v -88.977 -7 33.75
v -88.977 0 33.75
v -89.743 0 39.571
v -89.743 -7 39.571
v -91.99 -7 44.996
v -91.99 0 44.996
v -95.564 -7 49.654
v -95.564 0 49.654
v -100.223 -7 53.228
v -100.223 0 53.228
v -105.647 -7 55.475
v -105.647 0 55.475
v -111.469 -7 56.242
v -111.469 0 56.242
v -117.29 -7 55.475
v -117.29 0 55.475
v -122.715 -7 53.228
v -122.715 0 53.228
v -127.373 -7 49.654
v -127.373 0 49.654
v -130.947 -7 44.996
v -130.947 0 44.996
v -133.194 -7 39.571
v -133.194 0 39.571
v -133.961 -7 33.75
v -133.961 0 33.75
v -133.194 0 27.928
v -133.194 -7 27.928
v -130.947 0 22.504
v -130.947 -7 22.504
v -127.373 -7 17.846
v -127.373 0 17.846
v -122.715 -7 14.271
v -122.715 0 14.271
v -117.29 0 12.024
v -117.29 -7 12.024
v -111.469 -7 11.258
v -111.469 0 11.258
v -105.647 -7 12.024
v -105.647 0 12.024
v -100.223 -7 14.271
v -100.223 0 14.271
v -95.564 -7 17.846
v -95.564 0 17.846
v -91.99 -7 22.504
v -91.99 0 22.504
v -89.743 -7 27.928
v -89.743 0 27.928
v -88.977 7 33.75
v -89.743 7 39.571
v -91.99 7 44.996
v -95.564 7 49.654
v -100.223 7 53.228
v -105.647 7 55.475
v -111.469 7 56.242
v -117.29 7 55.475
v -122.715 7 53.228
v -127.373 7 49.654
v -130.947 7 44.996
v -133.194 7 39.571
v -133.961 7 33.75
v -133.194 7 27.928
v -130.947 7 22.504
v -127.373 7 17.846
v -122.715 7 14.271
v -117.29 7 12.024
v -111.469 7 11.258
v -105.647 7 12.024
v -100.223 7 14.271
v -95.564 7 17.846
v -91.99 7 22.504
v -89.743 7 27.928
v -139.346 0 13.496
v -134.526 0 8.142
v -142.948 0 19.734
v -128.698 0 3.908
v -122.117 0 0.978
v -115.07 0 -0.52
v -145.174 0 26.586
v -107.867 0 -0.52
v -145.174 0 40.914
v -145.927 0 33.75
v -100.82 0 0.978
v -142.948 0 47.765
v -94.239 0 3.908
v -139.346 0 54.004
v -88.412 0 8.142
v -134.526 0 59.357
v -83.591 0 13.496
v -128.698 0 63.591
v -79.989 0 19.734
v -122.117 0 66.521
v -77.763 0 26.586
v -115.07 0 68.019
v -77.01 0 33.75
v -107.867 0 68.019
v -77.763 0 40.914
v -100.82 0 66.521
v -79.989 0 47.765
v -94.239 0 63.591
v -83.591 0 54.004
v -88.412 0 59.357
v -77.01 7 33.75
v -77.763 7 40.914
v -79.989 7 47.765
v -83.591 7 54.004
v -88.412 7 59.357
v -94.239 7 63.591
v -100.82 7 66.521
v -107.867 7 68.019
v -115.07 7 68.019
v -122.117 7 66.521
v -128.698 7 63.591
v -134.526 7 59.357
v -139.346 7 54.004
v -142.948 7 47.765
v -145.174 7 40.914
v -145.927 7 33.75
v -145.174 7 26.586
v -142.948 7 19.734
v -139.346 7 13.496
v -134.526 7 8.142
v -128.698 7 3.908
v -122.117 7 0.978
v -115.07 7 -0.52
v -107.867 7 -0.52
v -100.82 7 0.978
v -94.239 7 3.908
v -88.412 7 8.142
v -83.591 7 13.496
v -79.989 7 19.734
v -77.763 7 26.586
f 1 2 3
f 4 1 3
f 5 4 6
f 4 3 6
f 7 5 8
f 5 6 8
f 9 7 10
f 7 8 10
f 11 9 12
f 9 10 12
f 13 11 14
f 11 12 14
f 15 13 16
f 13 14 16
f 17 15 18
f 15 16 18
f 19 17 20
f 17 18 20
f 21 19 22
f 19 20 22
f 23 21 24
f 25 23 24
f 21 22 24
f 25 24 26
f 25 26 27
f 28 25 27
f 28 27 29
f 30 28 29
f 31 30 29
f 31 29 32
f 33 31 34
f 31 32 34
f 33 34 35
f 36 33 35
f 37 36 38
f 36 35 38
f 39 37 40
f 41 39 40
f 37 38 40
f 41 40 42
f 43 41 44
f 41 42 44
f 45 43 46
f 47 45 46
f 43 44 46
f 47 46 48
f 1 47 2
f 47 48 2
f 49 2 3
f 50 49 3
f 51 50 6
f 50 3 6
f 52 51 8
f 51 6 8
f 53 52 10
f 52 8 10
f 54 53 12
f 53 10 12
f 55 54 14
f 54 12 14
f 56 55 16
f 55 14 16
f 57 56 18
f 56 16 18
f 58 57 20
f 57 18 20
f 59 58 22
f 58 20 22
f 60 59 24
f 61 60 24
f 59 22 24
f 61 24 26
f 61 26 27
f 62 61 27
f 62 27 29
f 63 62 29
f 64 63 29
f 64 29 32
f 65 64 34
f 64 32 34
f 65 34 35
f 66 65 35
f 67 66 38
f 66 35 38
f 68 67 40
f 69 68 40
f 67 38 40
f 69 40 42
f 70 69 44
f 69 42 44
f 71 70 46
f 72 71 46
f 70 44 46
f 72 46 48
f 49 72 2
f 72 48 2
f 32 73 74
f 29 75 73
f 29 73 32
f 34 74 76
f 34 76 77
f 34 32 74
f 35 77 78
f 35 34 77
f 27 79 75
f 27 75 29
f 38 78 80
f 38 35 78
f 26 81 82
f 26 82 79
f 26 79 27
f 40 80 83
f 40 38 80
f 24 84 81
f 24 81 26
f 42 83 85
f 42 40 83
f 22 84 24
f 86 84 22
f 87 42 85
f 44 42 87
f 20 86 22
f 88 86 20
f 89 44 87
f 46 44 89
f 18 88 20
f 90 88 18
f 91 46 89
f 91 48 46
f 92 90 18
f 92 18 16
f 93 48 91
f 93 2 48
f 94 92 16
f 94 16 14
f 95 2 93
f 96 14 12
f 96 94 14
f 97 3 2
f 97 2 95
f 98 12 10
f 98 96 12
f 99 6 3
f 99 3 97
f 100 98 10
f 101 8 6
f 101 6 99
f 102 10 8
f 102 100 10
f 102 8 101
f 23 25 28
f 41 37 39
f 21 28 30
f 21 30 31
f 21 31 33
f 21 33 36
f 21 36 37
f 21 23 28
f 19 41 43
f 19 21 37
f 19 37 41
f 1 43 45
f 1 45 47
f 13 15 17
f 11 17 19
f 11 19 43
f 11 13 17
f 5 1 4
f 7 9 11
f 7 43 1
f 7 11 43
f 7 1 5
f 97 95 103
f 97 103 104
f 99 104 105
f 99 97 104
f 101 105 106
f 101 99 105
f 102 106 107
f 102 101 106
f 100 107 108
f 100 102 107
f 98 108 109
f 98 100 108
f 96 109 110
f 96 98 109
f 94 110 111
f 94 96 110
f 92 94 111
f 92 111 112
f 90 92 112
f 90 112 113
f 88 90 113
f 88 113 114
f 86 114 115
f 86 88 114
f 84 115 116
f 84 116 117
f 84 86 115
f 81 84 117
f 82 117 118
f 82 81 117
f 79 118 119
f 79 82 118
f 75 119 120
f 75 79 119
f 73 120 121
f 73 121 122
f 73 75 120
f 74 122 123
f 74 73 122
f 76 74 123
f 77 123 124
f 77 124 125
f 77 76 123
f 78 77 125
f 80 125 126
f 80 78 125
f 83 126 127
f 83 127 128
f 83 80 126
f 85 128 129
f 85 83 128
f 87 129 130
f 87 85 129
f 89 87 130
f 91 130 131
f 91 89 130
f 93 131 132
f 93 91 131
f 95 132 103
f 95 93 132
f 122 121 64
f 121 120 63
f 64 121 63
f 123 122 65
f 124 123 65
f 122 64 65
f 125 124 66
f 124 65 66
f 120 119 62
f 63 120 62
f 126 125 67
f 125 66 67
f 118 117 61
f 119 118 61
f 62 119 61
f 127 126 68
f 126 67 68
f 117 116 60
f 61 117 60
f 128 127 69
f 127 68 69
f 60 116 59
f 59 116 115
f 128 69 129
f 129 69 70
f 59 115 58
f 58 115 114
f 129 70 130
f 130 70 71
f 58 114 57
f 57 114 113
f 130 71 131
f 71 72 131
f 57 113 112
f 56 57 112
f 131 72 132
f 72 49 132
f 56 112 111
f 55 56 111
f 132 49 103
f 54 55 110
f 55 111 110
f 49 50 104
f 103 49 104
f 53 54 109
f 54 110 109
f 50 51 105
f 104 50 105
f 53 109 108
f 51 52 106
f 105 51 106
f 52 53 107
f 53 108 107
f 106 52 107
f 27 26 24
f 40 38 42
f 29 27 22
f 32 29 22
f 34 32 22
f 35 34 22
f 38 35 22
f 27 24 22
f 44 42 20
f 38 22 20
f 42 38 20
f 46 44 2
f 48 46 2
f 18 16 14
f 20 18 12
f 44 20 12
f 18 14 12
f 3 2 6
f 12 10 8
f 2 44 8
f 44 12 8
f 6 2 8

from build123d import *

# Parameters (mm, degrees)
F0_R     = 22.491971
F1_DEPTH = 7
F0_R_2   = 34.458189
F2_DEPTH = 7


with BuildPart() as f1:
    # F0 (on Front) → F1 (new body)
    with BuildSketch(Plane.XZ):
        with Locations((-111.468591, 33.74977)):
            Circle(F0_R)
    extrude(amount=F1_DEPTH)


with BuildPart() as f2:
    # F0 (on Front) → F2 (new body)
    with BuildSketch(Plane.XZ):
        with Locations((-111.468591, 33.74977)):
            Circle(F0_R_2)
        with Locations((-111.468591, 33.74977)):
            Circle(F0_R, mode=Mode.SUBTRACT)
    extrude(amount=-F2_DEPTH)


solid = Compound([f1.part, f2.part])
